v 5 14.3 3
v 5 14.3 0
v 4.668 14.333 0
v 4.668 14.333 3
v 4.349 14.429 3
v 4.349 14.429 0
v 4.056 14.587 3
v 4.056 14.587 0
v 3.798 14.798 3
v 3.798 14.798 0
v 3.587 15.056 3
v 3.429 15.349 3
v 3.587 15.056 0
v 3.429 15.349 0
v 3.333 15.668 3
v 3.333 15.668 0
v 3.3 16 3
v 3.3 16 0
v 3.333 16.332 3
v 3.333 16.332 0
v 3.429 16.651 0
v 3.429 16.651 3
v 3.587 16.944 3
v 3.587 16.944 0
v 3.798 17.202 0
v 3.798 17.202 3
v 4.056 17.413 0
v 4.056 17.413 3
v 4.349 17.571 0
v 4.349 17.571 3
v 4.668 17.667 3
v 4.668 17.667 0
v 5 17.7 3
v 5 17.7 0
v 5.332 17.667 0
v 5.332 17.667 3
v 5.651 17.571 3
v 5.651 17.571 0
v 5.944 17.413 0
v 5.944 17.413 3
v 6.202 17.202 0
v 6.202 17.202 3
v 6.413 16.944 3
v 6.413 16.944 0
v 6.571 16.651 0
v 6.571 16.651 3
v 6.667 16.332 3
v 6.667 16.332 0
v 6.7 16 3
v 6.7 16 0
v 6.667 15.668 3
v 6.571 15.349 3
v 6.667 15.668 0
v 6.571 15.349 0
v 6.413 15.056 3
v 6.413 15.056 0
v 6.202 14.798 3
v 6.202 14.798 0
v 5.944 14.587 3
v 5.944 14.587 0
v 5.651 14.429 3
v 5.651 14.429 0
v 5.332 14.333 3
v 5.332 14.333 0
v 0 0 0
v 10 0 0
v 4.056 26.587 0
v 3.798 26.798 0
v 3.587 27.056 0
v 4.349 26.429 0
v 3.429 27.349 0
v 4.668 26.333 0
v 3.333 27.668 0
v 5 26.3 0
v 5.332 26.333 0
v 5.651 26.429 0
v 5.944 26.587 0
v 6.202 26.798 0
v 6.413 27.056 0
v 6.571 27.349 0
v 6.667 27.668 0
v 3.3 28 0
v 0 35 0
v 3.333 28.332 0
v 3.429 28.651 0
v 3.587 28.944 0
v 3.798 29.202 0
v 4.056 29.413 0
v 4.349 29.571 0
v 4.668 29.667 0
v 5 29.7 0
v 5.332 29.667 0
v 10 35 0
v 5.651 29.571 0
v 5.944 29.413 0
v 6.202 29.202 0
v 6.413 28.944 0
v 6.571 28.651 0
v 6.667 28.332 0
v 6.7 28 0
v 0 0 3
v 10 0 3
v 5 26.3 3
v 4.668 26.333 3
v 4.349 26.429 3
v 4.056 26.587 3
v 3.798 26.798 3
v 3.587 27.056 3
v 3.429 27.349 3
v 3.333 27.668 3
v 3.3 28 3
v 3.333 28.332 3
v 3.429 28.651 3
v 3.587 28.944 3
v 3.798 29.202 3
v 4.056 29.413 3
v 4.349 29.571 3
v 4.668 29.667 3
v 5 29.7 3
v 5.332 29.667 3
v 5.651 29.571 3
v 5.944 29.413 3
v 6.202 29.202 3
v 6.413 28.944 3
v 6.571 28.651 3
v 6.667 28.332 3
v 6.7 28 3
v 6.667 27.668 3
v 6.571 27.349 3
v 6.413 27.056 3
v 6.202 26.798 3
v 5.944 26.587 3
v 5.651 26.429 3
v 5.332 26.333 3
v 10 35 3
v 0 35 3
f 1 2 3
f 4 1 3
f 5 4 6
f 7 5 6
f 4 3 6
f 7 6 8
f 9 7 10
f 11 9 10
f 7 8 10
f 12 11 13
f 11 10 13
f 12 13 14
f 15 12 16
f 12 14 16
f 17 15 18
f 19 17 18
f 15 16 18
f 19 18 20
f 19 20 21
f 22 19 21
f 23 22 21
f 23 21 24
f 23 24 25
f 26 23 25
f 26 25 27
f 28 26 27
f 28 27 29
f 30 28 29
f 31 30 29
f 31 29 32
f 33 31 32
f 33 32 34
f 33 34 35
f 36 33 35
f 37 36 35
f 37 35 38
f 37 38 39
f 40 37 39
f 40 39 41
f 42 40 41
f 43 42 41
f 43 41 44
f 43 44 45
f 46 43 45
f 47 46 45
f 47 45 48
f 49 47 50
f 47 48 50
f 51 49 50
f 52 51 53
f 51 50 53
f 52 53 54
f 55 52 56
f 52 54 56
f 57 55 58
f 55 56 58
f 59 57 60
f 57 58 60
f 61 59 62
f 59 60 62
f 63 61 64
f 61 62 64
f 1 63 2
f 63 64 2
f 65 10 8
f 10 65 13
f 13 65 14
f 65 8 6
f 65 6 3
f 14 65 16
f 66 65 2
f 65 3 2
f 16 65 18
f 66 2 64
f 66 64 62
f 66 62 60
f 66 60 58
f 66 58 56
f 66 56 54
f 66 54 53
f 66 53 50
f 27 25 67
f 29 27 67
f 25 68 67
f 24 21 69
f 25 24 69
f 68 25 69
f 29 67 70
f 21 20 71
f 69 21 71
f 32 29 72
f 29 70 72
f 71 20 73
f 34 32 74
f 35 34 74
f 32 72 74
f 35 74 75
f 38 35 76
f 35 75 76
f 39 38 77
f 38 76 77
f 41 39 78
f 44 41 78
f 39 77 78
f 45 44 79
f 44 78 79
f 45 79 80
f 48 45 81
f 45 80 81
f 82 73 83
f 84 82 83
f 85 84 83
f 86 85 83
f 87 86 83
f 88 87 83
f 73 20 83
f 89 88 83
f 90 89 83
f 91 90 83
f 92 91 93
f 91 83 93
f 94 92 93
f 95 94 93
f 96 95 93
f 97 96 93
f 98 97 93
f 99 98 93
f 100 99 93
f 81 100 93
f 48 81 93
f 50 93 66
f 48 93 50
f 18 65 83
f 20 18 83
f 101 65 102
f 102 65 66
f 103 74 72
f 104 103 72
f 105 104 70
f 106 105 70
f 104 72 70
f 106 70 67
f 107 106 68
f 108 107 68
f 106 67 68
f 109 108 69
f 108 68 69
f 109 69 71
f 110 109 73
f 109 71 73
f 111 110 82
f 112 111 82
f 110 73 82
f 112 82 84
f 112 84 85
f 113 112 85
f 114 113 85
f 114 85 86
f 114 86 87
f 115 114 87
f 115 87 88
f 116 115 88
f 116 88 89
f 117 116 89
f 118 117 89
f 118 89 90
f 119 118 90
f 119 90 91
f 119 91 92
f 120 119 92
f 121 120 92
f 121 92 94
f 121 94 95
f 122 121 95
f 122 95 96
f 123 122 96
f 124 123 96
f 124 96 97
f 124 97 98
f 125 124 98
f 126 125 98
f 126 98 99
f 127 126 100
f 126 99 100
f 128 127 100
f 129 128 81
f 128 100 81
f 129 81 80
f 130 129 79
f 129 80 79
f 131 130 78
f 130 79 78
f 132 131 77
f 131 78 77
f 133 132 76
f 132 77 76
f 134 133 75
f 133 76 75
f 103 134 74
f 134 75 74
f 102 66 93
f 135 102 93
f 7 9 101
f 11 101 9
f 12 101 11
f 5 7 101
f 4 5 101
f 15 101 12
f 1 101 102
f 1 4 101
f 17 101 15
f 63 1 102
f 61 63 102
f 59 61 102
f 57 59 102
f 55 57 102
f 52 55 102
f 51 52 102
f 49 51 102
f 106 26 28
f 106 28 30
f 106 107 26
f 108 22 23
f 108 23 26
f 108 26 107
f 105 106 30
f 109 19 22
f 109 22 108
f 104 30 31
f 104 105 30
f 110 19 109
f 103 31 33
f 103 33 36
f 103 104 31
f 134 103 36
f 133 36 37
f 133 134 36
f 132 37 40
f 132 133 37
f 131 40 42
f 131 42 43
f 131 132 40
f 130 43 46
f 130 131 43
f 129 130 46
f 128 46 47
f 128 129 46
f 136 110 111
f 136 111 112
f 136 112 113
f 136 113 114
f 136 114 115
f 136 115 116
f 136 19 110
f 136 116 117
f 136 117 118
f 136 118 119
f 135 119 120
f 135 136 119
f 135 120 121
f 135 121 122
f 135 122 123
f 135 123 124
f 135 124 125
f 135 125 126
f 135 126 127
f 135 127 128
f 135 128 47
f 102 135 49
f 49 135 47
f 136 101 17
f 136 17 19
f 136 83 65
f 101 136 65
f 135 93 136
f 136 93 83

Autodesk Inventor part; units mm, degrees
ref_plane "YZ Plane" through (0, 0, 0) normal (1, 0, 0) x (0, 1, 0)
ref_plane "XZ Plane" through (0, 0, 0) normal (0, 1, 0) x (-1, 0, 0)
ref_plane "XY Plane" through (0, 0, 0) normal (0, 0, 1) x (1, 0, 0)
sketch "Sketch1" plane through (0, 0, 0) normal (0, 0, 1) x (1, 0, 0)
  line L0 (0, 0) -> (10, 0)
  line L1 (10, 0) -> (10, 35)
  line L2 (10, 35) -> (0, 35)
  line L3 (0, 35) -> (0, 0)
  dimension "d0" = 10
  dimension "d1" = 35
extrude "Extrusion1" add sketch "Sketch1" along normal blind 3
sketch "Sketch2" plane through (0, 0, 3) normal (0, 0, 1) x (1, 0, 0)
  line L0 (10, 35) -> (0, 35) projected
  line L1 (0, 35) -> (0, 0) projected
  point P0 (5, 28)
  point P1 (5, 16)
  dimension "d4" = 7
  dimension "d5" = 5
  dimension "d6" = 12
  dimension "d7" = 5
hole "Hole1" at (5, 28, 3) at (5, 16, 3) direction (0, 0, -1) diameter 3.4 end through all
sketch "Sketch3" plane through (0, 0, 3) normal (0, 0, 1) x (1, 0, 0)
  point P0 (0, 0)
sketch "Sketch4" plane through (0, 0, 3) normal (0, 0, 1) x (1, 0, 0)
  point P0 (0, 0)
properties part number "servoPipeConnection"
